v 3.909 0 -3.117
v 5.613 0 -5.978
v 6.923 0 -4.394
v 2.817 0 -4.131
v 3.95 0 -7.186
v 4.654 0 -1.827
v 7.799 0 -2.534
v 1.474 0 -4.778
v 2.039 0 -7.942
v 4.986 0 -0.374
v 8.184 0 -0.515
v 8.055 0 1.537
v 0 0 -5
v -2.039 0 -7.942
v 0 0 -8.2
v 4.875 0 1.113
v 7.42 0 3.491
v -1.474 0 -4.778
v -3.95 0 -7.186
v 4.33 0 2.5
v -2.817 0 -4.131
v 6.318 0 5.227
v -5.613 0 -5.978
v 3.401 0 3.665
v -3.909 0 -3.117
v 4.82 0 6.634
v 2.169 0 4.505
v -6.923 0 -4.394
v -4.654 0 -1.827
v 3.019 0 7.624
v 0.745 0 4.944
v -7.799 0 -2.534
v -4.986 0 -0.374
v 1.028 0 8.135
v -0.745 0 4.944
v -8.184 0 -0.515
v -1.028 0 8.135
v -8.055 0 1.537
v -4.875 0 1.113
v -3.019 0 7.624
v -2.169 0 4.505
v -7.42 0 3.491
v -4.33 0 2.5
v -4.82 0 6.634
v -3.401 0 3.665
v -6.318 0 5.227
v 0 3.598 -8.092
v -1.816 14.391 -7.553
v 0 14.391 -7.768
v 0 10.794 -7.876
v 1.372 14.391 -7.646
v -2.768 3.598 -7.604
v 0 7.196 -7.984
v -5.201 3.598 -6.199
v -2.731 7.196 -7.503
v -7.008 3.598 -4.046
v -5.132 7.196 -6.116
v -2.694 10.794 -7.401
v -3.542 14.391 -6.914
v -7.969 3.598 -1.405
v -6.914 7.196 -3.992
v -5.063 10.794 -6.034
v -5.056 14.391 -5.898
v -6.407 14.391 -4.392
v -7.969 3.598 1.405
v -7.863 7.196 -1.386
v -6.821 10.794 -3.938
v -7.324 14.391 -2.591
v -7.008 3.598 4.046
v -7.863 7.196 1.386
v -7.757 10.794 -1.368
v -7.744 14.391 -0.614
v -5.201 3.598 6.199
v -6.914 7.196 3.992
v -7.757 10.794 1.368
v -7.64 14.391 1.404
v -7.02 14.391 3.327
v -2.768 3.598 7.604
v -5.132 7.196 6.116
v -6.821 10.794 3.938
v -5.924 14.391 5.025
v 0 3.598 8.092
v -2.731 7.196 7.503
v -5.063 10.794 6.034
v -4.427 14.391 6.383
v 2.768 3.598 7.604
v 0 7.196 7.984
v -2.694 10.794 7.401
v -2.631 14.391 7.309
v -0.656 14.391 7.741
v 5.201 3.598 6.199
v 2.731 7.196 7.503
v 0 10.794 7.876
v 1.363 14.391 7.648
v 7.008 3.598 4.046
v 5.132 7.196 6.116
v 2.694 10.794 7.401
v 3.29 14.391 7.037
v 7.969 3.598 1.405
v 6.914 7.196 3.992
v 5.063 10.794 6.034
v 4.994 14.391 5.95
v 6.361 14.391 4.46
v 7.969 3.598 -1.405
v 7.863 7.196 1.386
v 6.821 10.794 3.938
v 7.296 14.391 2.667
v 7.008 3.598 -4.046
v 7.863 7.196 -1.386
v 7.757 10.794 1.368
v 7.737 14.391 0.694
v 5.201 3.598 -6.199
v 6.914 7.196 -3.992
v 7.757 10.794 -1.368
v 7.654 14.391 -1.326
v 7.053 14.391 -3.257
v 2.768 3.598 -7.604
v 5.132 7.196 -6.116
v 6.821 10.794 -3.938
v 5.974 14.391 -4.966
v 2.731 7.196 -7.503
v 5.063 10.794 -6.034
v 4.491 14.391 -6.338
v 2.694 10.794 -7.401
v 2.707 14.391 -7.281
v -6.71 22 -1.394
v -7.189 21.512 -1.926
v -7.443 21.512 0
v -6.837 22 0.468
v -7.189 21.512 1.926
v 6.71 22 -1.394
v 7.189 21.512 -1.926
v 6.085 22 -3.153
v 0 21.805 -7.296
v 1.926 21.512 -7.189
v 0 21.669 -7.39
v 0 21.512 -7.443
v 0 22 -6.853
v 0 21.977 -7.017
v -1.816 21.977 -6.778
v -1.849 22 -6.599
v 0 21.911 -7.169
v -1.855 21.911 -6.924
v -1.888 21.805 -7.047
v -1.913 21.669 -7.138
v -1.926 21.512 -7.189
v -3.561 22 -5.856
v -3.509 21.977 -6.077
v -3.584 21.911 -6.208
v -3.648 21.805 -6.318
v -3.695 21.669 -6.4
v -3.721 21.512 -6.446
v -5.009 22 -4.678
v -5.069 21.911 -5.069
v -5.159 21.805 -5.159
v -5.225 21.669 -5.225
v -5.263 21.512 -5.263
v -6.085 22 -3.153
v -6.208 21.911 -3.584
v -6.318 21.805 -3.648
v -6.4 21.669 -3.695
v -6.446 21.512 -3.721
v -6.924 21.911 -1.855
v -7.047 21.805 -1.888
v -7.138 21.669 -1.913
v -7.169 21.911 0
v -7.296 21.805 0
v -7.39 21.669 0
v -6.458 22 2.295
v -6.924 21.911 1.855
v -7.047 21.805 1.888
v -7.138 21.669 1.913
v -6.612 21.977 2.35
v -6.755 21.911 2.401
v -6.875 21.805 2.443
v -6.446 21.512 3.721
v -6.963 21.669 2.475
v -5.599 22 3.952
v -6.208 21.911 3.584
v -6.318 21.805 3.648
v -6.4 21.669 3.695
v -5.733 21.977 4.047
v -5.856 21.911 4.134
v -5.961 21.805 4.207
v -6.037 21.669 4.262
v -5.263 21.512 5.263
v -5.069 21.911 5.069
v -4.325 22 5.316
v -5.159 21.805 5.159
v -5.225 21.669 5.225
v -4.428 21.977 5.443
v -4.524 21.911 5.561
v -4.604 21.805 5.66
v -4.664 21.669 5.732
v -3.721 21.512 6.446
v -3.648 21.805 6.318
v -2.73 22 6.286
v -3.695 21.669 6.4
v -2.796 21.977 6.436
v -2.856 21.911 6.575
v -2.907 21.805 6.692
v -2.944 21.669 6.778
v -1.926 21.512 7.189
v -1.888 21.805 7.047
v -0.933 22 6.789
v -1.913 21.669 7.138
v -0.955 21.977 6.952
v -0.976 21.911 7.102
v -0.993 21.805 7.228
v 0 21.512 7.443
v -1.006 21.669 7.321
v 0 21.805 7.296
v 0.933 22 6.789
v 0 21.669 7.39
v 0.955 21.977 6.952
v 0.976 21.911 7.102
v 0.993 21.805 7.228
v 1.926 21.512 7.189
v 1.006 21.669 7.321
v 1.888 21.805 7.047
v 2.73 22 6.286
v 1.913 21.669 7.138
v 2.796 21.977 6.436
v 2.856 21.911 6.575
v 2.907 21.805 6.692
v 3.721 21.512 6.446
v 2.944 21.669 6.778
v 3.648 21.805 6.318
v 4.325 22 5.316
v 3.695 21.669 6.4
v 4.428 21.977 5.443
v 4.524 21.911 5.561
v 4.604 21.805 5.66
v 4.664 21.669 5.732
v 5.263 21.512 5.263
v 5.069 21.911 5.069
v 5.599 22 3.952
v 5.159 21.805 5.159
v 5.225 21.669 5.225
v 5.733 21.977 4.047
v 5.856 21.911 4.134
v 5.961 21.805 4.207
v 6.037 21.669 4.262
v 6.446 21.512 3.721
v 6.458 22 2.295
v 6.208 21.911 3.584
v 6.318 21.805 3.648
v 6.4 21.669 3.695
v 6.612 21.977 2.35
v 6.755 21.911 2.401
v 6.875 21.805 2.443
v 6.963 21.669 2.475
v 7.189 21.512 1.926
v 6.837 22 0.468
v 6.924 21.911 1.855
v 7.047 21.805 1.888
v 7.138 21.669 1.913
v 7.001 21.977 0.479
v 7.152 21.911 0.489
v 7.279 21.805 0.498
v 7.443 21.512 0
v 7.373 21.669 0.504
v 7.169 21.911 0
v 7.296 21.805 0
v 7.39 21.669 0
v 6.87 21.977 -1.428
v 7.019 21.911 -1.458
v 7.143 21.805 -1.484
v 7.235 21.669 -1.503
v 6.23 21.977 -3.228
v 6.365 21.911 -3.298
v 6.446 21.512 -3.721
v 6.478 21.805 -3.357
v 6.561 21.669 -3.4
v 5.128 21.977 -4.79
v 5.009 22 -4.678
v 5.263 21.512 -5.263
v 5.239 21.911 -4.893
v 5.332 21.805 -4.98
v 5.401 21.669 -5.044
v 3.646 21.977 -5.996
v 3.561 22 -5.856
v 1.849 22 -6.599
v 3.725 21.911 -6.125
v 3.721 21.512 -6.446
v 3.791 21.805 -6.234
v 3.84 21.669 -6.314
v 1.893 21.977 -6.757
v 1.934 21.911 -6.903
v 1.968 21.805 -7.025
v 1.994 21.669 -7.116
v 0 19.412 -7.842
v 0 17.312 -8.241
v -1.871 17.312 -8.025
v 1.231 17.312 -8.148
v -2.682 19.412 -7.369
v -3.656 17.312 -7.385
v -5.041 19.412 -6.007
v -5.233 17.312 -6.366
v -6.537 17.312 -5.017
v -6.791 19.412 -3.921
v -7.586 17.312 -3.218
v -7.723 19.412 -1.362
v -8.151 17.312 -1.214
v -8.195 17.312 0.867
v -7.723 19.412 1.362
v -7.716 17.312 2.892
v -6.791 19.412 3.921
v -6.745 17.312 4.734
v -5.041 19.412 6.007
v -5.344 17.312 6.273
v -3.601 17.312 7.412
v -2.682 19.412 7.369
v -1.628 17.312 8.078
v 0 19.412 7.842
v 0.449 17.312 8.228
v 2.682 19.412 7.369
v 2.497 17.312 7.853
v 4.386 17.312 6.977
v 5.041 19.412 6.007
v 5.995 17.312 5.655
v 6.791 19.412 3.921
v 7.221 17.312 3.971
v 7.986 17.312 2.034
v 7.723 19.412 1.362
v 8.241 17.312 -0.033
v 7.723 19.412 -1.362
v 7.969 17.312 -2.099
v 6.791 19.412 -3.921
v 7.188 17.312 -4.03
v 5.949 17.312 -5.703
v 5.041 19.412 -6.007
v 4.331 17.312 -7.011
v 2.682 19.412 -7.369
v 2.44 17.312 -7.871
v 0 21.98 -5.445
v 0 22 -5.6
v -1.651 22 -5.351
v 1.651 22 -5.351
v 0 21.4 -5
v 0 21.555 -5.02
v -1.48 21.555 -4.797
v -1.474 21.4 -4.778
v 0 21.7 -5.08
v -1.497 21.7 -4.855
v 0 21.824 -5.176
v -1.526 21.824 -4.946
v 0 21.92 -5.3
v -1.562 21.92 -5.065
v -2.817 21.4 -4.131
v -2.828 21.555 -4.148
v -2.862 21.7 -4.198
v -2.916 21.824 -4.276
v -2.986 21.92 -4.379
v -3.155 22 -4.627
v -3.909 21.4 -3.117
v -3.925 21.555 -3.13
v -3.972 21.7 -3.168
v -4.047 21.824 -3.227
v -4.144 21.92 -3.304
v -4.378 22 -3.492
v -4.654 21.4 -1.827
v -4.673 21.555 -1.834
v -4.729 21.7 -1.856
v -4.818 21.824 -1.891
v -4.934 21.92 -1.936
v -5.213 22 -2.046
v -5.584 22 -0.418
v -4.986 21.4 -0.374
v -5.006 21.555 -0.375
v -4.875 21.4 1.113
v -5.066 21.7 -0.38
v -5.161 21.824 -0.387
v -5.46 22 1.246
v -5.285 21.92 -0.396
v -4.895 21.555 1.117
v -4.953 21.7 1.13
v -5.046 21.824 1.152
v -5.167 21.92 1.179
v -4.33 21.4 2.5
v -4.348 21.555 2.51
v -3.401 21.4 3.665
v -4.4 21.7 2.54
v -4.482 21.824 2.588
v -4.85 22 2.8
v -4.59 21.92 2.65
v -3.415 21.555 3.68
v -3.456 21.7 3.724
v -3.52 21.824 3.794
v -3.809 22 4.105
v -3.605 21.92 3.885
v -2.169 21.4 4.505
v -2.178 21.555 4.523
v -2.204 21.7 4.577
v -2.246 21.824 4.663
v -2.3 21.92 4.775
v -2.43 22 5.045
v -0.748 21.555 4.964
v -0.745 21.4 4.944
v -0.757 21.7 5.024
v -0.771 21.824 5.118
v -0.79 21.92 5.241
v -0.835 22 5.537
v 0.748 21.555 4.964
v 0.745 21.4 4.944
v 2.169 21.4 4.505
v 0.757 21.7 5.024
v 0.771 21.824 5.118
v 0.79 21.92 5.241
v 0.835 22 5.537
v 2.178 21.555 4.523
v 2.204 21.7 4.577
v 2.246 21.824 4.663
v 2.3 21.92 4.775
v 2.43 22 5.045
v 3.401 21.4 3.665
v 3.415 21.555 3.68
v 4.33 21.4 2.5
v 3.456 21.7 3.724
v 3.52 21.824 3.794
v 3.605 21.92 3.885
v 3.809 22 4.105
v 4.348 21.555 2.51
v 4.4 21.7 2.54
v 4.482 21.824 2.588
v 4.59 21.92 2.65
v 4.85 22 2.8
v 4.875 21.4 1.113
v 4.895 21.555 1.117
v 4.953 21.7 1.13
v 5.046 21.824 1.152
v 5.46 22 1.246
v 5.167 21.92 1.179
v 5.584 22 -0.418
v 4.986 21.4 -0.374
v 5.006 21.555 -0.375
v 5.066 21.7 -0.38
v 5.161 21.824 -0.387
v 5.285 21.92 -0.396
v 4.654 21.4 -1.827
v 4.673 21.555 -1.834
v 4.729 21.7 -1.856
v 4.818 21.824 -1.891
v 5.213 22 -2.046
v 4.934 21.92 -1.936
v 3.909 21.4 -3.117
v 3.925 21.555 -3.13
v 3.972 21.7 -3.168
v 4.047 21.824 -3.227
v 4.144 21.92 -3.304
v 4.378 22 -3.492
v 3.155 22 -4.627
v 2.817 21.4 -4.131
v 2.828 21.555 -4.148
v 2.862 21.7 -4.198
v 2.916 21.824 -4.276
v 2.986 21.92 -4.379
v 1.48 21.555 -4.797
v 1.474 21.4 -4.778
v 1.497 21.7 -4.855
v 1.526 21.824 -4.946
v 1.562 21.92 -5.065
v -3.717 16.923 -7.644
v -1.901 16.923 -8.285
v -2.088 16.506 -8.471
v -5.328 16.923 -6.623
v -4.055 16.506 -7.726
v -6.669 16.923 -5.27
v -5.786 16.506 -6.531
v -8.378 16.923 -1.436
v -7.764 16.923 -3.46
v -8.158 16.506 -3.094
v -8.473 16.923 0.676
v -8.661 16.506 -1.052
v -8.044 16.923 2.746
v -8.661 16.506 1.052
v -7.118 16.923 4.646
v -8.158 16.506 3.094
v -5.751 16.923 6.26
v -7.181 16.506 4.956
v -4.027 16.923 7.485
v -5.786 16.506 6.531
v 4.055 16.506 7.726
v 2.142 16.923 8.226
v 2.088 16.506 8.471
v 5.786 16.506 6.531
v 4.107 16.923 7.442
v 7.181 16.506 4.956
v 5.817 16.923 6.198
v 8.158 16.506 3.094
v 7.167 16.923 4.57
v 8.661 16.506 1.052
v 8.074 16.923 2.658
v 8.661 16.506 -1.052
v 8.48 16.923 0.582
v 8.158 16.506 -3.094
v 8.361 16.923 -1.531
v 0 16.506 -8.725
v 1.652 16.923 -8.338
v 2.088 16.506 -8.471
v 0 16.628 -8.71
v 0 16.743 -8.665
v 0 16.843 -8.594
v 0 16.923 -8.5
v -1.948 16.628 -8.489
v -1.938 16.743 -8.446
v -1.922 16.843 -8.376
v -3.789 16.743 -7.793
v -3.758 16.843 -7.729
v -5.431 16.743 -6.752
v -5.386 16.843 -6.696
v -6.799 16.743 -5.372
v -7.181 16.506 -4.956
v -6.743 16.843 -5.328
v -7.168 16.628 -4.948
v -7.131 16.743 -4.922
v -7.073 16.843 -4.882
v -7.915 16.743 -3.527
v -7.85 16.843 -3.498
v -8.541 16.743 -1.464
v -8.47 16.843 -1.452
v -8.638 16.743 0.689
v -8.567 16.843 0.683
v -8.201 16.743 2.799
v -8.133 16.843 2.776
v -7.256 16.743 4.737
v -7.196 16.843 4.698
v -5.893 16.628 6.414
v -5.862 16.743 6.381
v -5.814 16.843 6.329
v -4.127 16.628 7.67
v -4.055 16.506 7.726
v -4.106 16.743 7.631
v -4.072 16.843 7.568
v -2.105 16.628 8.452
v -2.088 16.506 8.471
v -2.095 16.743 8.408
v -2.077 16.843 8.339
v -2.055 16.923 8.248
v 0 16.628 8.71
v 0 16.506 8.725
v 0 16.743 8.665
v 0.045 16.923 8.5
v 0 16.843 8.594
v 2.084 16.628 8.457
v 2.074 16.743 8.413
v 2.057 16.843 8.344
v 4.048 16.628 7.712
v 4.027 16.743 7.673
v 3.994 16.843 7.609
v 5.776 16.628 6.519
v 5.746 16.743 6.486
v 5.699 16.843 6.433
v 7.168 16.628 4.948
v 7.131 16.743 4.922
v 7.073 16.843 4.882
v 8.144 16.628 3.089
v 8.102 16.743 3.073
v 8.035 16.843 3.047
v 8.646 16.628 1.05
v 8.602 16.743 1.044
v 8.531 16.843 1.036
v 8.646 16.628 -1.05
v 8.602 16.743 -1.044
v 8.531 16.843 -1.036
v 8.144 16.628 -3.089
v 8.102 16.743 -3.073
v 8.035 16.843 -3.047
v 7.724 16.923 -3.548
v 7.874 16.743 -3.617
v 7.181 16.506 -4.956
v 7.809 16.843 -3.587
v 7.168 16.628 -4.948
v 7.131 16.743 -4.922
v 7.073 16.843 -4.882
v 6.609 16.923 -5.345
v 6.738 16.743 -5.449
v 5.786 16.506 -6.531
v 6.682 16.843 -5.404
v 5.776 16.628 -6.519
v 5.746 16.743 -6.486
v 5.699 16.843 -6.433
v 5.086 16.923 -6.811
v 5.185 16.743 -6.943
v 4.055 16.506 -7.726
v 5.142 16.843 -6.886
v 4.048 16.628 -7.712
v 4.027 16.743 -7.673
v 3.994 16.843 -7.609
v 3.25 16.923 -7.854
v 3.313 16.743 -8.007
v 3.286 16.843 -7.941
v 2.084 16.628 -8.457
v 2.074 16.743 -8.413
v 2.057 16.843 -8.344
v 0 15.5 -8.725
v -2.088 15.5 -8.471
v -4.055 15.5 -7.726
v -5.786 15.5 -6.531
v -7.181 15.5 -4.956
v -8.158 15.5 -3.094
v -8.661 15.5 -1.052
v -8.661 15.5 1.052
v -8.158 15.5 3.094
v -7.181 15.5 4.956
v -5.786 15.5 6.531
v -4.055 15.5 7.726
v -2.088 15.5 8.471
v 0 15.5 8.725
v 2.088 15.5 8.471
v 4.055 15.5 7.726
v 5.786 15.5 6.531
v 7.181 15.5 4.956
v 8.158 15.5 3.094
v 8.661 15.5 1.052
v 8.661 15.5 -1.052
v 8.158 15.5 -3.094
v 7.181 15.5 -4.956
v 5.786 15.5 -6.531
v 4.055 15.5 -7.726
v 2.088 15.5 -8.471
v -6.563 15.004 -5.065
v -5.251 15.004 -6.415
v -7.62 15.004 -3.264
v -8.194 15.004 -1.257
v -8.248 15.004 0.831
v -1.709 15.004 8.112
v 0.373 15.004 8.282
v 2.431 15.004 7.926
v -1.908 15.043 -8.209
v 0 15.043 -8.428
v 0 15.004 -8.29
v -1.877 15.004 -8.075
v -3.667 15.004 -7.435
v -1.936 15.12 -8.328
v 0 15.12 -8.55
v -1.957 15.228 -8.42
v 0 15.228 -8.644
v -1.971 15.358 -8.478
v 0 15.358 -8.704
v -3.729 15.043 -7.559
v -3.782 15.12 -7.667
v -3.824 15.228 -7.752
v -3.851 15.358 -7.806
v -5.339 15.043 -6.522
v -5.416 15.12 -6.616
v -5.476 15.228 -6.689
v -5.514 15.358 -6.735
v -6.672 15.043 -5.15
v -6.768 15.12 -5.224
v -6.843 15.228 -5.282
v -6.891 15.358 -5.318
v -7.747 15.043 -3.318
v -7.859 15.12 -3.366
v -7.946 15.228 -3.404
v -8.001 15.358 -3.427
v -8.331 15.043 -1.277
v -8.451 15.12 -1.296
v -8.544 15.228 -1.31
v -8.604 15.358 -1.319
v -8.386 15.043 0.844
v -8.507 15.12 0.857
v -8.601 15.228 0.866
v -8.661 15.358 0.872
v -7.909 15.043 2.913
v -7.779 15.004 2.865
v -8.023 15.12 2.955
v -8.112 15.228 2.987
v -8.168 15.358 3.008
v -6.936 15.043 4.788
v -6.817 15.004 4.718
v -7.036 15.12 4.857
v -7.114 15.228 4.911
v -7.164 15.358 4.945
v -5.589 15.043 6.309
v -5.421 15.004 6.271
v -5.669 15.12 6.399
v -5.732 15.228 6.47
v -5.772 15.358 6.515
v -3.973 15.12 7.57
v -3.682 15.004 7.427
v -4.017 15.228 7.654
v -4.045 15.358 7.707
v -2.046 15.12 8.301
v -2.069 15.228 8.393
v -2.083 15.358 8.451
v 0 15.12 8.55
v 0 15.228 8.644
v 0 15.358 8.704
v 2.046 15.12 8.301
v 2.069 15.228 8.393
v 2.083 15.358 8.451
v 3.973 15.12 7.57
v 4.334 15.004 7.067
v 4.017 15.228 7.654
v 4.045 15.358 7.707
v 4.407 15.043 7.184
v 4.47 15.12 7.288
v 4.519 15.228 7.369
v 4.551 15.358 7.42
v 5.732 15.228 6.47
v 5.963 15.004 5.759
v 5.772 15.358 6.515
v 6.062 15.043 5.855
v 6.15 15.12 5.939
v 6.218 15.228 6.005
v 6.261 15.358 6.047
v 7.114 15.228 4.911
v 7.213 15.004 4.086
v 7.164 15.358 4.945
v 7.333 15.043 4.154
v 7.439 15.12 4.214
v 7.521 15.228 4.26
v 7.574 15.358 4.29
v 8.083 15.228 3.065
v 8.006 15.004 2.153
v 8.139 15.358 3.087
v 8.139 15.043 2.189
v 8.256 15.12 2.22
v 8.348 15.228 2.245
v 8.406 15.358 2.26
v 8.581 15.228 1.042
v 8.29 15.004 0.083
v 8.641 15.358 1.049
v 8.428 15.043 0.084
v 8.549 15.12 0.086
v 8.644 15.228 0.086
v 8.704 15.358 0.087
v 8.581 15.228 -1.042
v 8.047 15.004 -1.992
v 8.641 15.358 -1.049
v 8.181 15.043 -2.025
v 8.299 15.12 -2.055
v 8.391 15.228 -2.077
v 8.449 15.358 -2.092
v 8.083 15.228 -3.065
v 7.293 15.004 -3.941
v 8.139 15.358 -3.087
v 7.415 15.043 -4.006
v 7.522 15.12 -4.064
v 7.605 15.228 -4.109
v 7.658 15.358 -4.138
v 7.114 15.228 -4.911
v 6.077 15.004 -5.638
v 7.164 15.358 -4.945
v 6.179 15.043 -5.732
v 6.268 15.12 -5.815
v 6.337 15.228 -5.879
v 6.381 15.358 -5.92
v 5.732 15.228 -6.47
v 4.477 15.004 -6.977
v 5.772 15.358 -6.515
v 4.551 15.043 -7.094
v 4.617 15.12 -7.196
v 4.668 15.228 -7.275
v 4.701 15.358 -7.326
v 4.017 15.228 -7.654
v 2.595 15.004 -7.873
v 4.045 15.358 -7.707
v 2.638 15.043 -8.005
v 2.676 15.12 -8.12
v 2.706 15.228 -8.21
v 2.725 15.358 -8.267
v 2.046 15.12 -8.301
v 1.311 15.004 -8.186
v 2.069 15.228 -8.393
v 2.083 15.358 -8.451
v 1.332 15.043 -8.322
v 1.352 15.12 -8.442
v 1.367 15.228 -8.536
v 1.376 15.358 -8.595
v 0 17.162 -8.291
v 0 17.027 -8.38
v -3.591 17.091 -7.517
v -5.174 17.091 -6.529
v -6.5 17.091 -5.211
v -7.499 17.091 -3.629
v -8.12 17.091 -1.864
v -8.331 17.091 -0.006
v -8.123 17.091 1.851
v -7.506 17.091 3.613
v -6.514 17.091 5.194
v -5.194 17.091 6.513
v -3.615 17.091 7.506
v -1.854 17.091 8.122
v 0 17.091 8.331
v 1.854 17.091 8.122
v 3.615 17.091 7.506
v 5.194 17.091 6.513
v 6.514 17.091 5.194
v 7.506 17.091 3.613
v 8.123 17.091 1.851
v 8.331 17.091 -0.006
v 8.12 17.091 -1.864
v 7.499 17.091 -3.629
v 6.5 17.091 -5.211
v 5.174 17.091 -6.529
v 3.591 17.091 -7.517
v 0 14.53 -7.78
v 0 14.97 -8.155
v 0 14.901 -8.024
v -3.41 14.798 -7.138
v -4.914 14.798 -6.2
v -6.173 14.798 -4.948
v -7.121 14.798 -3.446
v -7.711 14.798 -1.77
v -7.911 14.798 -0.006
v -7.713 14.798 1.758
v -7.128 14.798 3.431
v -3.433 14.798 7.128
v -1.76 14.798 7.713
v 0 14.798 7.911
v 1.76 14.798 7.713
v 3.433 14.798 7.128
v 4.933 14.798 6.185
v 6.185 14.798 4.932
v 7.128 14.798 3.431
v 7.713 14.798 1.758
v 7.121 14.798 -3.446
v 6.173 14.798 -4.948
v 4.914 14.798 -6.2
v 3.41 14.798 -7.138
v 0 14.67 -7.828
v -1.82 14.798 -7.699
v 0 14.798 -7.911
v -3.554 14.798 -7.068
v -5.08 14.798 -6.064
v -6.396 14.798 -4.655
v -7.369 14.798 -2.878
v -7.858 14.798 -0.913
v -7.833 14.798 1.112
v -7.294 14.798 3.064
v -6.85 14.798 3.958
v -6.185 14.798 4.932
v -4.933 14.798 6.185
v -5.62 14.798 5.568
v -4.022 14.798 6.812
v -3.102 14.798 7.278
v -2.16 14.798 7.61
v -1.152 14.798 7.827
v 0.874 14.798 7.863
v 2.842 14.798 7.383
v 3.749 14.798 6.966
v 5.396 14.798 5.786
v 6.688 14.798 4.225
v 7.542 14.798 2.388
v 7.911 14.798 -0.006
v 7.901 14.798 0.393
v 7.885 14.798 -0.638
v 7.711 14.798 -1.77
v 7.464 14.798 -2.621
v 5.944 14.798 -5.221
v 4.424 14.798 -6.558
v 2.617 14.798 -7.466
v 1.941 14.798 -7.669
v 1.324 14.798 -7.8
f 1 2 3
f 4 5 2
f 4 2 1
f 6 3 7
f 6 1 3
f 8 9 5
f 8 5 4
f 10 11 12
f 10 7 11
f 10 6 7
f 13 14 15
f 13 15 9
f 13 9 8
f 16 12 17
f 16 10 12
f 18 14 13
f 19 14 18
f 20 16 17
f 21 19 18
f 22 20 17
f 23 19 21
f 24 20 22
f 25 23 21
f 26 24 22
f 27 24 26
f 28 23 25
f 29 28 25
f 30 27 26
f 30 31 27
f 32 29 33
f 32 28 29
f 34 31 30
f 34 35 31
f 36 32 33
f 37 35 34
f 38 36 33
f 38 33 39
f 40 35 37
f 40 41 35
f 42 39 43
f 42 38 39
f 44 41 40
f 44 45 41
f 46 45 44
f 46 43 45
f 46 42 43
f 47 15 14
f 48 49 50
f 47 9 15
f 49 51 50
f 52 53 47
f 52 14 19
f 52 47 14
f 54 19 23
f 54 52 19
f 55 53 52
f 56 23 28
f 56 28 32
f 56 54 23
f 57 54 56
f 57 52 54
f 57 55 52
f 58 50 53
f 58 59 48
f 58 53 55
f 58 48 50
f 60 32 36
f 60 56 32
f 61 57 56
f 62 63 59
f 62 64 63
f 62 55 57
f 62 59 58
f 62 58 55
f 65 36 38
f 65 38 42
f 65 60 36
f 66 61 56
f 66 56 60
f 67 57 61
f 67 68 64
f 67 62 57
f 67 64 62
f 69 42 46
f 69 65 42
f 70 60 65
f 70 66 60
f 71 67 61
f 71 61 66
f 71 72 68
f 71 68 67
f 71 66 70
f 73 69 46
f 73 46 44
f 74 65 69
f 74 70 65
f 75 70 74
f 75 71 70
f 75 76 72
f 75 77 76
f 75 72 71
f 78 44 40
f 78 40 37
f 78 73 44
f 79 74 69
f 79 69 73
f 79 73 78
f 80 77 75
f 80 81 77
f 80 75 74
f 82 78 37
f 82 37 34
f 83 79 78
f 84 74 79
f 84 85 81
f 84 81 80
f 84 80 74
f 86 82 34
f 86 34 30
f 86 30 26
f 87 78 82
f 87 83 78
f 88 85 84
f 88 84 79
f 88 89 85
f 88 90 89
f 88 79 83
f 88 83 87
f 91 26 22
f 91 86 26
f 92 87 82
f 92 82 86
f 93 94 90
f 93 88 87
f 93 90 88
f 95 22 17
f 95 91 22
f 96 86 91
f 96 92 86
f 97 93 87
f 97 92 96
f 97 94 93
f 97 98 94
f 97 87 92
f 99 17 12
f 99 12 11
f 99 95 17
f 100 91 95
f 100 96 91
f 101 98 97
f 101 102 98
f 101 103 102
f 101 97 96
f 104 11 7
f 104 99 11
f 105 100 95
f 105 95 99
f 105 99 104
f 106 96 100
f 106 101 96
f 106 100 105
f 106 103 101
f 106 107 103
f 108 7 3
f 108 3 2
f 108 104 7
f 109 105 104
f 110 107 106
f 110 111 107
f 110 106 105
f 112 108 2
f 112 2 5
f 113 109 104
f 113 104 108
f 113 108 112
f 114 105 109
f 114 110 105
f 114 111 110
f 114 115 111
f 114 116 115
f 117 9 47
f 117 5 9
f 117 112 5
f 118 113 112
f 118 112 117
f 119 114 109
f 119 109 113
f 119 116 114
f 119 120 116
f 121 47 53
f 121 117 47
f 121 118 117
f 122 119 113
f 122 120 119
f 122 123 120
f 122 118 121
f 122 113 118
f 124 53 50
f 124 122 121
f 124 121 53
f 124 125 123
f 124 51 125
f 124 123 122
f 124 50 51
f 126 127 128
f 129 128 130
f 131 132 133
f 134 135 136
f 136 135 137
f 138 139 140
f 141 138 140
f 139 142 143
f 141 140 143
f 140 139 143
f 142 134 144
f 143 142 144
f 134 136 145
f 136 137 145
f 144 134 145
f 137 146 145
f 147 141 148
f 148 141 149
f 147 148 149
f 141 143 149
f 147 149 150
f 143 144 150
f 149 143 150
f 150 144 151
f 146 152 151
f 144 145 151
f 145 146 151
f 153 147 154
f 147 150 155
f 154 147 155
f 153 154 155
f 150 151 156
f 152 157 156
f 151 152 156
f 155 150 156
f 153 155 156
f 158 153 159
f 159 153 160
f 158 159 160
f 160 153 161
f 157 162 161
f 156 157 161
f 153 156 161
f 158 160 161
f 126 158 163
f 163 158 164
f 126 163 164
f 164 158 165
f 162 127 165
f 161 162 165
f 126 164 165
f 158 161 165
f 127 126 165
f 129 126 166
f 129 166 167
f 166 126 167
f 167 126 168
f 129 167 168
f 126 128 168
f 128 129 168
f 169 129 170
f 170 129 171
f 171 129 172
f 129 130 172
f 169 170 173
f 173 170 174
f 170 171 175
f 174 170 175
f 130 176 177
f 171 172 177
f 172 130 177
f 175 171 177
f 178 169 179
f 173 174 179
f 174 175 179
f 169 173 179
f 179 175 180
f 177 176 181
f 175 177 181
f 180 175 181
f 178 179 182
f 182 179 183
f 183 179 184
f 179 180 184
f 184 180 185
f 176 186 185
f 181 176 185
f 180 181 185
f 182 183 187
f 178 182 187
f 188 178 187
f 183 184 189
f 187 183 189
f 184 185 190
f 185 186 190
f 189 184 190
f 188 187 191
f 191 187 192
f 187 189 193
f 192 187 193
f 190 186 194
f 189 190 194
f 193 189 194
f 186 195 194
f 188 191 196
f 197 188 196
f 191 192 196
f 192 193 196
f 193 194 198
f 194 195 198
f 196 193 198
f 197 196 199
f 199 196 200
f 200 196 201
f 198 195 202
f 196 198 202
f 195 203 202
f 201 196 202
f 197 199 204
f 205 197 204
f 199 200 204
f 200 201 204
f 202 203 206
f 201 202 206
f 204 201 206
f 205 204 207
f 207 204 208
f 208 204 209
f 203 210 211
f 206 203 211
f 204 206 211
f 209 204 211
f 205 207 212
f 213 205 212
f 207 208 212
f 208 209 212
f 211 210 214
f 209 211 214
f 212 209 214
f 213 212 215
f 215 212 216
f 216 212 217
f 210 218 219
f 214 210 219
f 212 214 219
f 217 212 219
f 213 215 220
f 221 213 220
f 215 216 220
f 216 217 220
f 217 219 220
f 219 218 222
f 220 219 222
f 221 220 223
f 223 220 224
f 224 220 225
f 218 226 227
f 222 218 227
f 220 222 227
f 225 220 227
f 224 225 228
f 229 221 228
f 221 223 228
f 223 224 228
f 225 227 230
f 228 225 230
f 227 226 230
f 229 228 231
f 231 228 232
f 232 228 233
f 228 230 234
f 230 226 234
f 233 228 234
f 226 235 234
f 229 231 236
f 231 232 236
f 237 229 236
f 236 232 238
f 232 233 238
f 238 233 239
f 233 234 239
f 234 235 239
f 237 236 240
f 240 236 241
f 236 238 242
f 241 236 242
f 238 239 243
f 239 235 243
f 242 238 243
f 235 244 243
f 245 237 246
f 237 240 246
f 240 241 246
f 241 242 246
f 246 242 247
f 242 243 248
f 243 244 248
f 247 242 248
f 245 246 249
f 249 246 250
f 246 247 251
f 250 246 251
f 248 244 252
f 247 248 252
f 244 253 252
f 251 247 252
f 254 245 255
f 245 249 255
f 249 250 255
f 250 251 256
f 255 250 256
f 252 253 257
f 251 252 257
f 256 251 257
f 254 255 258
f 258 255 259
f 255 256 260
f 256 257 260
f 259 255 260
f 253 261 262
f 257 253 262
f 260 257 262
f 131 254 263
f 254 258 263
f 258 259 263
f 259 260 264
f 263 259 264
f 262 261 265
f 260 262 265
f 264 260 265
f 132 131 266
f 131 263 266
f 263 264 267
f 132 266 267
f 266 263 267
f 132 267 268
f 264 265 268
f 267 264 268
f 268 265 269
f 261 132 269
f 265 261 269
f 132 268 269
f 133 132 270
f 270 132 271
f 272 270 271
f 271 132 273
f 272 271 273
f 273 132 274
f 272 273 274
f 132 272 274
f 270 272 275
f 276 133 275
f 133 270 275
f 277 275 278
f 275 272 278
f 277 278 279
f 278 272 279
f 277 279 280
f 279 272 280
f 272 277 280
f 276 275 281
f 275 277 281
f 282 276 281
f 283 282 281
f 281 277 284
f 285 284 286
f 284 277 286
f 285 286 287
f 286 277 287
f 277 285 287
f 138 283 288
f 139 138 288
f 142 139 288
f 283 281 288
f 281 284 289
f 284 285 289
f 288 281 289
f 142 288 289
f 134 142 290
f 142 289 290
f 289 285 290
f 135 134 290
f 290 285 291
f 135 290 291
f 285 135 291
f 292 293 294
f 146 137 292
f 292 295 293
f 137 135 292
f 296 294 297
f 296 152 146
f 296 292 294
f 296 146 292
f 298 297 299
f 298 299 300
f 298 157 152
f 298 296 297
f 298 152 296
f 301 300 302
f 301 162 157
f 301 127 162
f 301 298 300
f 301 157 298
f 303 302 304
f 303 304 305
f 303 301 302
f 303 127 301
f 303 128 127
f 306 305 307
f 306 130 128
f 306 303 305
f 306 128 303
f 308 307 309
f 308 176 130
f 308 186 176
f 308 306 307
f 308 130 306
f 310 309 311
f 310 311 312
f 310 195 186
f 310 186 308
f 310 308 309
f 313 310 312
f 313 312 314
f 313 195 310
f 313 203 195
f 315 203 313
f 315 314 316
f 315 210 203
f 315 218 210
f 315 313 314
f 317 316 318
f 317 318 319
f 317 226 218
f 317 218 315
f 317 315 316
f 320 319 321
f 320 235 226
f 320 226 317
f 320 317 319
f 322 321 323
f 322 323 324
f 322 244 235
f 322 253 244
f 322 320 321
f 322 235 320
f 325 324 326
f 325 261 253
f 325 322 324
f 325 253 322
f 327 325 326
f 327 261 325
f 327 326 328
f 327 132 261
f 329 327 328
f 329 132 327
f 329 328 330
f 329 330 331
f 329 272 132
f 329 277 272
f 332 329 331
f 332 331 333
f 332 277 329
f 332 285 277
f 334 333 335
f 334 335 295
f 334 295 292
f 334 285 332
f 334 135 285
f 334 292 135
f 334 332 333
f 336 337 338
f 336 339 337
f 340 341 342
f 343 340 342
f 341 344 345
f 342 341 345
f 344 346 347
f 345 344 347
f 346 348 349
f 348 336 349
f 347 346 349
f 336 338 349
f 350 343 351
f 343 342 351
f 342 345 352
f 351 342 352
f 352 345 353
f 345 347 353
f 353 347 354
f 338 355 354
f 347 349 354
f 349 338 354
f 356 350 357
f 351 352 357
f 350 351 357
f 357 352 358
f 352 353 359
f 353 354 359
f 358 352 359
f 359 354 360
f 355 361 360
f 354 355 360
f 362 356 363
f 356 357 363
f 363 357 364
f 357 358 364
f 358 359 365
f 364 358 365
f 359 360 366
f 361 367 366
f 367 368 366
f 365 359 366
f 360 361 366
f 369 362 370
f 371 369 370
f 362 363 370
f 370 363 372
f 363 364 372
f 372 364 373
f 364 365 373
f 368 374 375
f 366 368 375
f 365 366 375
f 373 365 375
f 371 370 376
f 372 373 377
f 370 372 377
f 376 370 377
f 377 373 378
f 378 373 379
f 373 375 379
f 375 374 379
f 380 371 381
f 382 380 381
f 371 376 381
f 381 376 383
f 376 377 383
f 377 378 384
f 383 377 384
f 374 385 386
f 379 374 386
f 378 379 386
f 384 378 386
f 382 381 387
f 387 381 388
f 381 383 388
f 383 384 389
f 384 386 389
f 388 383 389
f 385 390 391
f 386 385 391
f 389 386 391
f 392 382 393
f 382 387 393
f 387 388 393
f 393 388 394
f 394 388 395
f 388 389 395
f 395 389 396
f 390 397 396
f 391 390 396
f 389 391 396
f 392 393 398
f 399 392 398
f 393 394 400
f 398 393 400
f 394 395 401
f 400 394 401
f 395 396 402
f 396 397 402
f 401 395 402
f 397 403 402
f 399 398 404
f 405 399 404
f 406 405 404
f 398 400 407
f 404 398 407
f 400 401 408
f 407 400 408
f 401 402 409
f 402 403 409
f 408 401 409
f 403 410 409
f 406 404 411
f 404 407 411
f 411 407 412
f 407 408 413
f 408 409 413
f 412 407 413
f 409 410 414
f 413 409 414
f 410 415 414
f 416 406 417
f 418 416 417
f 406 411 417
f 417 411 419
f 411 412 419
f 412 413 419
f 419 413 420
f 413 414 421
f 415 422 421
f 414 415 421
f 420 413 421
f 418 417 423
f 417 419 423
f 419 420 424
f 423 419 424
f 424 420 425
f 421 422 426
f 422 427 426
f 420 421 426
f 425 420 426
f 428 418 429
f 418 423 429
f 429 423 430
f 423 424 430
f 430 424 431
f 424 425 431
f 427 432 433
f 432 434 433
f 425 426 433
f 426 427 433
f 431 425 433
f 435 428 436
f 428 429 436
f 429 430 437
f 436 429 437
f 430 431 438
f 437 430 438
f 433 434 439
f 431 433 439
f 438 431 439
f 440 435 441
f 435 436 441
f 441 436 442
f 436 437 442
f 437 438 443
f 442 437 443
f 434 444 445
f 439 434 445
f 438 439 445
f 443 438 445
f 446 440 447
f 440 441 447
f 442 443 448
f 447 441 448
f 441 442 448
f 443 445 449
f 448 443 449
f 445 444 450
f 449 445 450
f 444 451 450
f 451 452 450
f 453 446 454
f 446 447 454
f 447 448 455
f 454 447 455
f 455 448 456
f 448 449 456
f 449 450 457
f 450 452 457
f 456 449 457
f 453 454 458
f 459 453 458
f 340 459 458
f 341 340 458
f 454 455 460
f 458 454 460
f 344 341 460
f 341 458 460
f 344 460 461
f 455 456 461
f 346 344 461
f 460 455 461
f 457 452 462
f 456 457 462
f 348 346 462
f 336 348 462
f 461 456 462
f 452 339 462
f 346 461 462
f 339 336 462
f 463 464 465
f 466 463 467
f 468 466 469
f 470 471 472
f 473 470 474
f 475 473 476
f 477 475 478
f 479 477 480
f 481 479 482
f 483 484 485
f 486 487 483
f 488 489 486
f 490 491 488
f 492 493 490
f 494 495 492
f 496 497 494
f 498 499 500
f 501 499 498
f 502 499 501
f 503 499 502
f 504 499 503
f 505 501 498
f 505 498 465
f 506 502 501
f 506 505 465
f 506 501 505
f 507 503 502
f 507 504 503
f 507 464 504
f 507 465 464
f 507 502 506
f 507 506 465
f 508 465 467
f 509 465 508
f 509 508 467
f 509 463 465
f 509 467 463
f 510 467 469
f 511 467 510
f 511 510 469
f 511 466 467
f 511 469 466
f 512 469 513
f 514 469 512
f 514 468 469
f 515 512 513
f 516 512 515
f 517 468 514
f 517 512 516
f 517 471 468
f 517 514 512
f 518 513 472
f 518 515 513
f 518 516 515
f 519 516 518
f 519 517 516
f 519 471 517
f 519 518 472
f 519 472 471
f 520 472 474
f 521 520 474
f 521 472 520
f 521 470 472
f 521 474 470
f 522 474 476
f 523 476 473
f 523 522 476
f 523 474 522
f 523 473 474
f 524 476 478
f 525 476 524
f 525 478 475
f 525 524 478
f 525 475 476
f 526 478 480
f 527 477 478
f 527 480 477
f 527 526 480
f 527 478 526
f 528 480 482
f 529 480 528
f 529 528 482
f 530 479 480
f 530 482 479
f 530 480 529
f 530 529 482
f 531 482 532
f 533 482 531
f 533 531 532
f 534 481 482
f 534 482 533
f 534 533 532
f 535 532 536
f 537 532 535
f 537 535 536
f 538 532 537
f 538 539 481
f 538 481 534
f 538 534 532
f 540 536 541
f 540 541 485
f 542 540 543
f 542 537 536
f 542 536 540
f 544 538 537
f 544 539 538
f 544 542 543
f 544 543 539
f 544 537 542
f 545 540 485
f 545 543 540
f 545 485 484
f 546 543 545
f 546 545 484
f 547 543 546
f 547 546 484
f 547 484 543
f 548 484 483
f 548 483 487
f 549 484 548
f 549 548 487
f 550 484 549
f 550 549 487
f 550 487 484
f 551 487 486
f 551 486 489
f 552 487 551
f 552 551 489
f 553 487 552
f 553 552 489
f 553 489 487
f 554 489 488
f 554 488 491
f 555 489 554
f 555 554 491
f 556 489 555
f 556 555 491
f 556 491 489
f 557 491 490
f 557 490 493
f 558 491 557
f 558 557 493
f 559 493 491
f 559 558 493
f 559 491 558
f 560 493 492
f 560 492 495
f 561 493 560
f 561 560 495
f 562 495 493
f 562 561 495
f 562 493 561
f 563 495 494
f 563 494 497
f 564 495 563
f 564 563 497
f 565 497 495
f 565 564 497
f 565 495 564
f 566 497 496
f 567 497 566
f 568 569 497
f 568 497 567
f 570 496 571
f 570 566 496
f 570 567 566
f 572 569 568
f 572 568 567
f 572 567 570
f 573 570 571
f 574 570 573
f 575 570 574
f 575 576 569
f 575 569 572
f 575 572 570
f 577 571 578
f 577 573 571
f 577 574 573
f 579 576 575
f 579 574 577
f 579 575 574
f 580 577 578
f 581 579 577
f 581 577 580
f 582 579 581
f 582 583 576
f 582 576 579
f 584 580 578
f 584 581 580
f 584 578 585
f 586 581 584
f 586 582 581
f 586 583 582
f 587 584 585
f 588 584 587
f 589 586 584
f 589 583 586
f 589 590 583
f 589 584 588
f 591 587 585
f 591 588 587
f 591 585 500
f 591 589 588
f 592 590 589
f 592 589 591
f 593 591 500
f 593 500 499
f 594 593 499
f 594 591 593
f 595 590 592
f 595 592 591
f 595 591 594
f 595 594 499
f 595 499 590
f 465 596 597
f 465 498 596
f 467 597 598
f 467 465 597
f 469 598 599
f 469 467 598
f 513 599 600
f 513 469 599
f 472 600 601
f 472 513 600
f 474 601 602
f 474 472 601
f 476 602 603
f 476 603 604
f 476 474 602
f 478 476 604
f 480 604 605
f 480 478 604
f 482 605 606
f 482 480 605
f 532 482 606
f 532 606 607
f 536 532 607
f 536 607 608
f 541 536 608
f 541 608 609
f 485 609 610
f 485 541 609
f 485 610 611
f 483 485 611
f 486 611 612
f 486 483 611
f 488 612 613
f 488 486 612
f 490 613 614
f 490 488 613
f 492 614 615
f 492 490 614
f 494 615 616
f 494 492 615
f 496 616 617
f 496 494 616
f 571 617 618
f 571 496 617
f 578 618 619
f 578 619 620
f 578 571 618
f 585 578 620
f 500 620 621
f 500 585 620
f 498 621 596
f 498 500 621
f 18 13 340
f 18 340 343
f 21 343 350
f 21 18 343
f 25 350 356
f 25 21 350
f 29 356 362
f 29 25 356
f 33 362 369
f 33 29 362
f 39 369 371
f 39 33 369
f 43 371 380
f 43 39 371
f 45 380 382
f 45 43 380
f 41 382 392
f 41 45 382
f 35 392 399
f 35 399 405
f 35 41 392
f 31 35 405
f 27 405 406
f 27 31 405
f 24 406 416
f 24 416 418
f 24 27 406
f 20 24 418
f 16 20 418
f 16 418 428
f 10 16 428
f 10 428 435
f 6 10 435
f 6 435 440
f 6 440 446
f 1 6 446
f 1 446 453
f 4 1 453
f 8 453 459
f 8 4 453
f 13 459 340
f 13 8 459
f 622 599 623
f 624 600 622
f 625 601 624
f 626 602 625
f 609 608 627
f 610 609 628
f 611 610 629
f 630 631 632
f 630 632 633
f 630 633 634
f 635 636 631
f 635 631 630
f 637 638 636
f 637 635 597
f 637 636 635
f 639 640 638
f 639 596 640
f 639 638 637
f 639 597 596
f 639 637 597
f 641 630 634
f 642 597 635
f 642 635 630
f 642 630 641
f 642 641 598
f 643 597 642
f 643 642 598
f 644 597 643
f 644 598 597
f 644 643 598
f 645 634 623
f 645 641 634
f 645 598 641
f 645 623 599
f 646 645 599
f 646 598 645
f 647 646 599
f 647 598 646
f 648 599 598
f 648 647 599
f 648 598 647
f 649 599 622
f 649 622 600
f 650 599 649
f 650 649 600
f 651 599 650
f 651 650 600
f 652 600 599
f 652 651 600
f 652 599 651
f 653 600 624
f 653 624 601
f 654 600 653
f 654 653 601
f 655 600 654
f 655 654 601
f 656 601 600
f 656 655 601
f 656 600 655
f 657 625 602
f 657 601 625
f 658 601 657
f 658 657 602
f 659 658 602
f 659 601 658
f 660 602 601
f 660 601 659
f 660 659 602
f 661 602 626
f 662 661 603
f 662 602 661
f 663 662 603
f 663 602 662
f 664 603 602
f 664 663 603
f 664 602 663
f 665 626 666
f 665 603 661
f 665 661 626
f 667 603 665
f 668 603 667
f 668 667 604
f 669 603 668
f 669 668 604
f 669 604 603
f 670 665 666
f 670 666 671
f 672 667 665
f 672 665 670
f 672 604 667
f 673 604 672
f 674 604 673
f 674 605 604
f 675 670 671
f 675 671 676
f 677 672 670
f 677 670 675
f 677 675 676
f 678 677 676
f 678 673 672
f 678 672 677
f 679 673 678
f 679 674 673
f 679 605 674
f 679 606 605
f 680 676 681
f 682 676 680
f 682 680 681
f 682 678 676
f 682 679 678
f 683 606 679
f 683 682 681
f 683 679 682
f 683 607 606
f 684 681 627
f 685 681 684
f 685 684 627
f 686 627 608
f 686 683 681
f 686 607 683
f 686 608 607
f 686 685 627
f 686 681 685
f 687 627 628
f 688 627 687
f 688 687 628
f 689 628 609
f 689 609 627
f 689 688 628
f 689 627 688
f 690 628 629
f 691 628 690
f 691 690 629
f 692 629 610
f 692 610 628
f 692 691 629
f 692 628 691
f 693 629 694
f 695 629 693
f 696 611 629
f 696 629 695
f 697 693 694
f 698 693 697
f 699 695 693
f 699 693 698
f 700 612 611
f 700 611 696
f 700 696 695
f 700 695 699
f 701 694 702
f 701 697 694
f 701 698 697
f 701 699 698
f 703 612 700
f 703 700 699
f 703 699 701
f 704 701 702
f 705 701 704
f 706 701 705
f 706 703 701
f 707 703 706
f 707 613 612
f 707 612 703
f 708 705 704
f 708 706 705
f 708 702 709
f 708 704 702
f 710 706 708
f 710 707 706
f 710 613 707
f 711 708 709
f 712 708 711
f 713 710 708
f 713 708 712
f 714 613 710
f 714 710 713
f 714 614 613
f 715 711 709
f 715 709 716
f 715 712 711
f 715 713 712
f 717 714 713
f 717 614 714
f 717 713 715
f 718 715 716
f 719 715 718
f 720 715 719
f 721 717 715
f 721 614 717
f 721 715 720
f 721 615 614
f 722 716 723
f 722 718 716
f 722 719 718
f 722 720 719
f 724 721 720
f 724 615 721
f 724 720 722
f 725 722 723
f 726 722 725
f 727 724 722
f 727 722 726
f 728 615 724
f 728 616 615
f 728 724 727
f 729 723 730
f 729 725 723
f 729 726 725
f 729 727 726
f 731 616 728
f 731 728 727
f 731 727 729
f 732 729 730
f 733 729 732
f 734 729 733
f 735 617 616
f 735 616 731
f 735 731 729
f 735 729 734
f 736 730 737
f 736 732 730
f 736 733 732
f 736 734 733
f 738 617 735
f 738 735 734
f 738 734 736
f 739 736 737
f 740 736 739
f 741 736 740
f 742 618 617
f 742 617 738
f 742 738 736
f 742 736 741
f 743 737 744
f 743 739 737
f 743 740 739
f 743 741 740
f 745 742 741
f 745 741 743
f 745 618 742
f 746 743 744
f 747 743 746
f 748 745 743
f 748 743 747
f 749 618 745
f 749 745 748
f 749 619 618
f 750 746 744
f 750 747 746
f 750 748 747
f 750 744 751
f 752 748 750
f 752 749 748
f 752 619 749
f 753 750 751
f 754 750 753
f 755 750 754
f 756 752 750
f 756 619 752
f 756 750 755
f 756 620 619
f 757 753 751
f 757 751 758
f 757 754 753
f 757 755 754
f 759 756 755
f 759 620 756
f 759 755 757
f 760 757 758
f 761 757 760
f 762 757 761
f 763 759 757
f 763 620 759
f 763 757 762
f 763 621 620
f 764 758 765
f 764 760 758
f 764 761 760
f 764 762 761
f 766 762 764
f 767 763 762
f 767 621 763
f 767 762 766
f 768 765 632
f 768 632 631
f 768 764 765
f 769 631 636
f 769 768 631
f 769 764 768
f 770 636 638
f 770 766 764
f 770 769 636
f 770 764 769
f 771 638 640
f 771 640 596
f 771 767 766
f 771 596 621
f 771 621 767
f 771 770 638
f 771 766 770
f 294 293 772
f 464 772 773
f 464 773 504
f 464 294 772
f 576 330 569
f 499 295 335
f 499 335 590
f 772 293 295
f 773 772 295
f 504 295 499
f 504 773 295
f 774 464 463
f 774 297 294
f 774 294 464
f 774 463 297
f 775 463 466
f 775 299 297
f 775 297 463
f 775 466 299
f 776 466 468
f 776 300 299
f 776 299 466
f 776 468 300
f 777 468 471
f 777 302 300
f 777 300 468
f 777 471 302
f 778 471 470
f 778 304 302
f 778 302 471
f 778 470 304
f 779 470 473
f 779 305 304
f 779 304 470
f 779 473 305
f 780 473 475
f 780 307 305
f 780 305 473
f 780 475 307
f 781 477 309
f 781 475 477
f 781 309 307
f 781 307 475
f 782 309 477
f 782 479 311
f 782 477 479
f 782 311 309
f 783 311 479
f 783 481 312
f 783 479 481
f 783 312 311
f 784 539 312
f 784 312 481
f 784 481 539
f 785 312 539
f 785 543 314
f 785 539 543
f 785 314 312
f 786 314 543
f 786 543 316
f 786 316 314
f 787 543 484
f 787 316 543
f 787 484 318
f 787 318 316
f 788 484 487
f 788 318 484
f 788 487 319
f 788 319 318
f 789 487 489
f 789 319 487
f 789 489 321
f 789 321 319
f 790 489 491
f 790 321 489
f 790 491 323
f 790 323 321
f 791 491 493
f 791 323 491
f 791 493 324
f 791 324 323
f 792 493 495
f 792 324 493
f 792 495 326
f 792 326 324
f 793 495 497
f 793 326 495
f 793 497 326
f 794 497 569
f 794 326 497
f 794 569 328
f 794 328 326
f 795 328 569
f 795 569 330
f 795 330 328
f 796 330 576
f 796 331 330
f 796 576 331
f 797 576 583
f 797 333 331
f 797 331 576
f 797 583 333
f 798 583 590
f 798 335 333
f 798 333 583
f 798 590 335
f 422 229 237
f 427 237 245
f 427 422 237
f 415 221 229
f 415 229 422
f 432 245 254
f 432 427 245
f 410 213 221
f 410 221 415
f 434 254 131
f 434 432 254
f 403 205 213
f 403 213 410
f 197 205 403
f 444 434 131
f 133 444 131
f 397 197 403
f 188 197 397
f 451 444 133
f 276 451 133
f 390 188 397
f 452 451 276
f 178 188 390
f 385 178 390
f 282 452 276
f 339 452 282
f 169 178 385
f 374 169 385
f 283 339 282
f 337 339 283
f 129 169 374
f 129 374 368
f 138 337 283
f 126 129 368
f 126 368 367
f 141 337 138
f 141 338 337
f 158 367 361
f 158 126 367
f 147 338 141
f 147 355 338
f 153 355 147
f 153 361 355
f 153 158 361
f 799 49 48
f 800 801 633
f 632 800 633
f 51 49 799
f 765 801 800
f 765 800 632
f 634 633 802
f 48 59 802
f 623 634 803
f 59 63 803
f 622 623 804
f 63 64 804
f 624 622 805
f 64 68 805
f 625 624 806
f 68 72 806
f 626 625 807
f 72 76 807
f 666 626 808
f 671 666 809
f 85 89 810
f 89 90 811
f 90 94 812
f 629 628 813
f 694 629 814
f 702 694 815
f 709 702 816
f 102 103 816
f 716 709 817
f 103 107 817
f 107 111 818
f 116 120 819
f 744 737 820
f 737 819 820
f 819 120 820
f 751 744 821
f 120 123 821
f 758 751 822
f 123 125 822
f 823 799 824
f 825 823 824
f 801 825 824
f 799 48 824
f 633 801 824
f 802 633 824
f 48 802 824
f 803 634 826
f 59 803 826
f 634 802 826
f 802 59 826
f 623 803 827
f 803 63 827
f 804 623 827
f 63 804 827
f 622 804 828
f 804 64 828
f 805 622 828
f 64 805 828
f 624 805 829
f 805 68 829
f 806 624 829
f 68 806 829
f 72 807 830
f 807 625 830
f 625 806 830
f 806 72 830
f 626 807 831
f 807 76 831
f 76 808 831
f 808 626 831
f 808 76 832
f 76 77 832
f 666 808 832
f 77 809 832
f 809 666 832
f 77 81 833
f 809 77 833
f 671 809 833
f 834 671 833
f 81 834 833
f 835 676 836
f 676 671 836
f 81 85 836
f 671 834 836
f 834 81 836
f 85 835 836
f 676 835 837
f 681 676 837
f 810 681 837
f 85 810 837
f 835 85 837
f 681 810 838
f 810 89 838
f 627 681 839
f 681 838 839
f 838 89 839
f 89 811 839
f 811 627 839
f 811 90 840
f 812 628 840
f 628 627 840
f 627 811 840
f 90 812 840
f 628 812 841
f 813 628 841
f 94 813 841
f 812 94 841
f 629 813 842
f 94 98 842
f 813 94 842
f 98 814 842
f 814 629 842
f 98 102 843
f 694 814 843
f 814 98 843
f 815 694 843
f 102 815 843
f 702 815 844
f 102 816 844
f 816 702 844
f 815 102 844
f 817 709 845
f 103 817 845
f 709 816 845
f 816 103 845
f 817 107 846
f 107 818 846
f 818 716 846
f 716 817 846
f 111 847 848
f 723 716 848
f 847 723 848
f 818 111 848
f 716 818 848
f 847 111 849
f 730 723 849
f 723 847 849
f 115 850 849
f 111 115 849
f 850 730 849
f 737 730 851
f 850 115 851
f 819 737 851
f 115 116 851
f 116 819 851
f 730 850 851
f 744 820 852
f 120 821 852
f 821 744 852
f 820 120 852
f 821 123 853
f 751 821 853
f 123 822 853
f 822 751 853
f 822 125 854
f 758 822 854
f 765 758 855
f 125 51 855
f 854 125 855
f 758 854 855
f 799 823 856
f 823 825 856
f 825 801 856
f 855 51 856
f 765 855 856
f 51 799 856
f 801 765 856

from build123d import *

# Parameters (mm, degrees)
FILLET1_R = 0.5
FILLET2_R = 0.6


with BuildPart() as part:
    # Sketch1 → Revolve1 (revolve)
    with BuildSketch(Plane.XY, mode=Mode.PRIVATE) as revolve1_sk:
        Polygon((5, 22), (5, 0), (8.2, 0), (7.75, 15), (8.725, 15), (8.725, 17), (8.3, 17), (7.35, 22), align=None)
    revolve(revolve1_sk.sketch.rotate(Axis((0, 0, 0), (0, 1, 0)), 90), axis=Axis((0, 0, 0), (0, 1, 0)))

    # Fillet1
    # the kernel refuses this fillet: 0.5 mm, written as the material it takes off along each edge
    with BuildSketch(Plane(origin=(0, 17, 0), x_dir=(0, 0, -1), z_dir=(1, 0, 0))) as fillet1_piece_1:
        with BuildLine():
            CenterArc((8.225, -0.494342998), FILLET1_R, 0, 81.373073441)
            Line((8.3, 0), (8.3015, 0.00988686))
            ThreePointArc((8.3015, 0.00988686), (8.5125, 0.01), (8.725, 0.01))
            Line((8.725, 0.01), (8.735, 0))
            Line((8.735, 0), (8.735, -0.494342998))
            Line((8.735, -0.494342998), (8.725, -0.494342998))
        make_face()
    revolve(axis=Axis((0, 17, 0), (0, 1, 0)), mode=Mode.SUBTRACT)
    with BuildSketch(Plane(origin=(0, 15, 0), x_dir=(0, 0, -1), z_dir=(1, 0, 0))) as fillet1_piece_2:
        with BuildLine():
            CenterArc((8.725 - FILLET1_R, FILLET1_R), FILLET1_R, 270, 90)
            Line((8.725, FILLET1_R), (8.725 + FILLET1_R * 0.02, FILLET1_R))
            Line((8.725 + FILLET1_R * 0.02, FILLET1_R), (8.725 + FILLET1_R * 0.02, -FILLET1_R * 0.02))
            Line((8.725 + FILLET1_R * 0.02, -FILLET1_R * 0.02), (8.725 - FILLET1_R, -FILLET1_R * 0.02))
            Line((8.725 - FILLET1_R, -FILLET1_R * 0.02), (8.725 - FILLET1_R, 0))
        make_face()
    revolve(axis=Axis((0, 15, 0), (0, 1, 0)), mode=Mode.SUBTRACT)

    # Fillet2
    fillet2_edges = [part.edges().sort_by_distance(p)[0] for p in [
        (0, 15, 7.75),
        (0, 17, 8.3),
        (0, 22, 5),
        (0, 22, 7.35),
    ]]
    fillet(fillet2_edges, radius=FILLET2_R)


solid = part.part
